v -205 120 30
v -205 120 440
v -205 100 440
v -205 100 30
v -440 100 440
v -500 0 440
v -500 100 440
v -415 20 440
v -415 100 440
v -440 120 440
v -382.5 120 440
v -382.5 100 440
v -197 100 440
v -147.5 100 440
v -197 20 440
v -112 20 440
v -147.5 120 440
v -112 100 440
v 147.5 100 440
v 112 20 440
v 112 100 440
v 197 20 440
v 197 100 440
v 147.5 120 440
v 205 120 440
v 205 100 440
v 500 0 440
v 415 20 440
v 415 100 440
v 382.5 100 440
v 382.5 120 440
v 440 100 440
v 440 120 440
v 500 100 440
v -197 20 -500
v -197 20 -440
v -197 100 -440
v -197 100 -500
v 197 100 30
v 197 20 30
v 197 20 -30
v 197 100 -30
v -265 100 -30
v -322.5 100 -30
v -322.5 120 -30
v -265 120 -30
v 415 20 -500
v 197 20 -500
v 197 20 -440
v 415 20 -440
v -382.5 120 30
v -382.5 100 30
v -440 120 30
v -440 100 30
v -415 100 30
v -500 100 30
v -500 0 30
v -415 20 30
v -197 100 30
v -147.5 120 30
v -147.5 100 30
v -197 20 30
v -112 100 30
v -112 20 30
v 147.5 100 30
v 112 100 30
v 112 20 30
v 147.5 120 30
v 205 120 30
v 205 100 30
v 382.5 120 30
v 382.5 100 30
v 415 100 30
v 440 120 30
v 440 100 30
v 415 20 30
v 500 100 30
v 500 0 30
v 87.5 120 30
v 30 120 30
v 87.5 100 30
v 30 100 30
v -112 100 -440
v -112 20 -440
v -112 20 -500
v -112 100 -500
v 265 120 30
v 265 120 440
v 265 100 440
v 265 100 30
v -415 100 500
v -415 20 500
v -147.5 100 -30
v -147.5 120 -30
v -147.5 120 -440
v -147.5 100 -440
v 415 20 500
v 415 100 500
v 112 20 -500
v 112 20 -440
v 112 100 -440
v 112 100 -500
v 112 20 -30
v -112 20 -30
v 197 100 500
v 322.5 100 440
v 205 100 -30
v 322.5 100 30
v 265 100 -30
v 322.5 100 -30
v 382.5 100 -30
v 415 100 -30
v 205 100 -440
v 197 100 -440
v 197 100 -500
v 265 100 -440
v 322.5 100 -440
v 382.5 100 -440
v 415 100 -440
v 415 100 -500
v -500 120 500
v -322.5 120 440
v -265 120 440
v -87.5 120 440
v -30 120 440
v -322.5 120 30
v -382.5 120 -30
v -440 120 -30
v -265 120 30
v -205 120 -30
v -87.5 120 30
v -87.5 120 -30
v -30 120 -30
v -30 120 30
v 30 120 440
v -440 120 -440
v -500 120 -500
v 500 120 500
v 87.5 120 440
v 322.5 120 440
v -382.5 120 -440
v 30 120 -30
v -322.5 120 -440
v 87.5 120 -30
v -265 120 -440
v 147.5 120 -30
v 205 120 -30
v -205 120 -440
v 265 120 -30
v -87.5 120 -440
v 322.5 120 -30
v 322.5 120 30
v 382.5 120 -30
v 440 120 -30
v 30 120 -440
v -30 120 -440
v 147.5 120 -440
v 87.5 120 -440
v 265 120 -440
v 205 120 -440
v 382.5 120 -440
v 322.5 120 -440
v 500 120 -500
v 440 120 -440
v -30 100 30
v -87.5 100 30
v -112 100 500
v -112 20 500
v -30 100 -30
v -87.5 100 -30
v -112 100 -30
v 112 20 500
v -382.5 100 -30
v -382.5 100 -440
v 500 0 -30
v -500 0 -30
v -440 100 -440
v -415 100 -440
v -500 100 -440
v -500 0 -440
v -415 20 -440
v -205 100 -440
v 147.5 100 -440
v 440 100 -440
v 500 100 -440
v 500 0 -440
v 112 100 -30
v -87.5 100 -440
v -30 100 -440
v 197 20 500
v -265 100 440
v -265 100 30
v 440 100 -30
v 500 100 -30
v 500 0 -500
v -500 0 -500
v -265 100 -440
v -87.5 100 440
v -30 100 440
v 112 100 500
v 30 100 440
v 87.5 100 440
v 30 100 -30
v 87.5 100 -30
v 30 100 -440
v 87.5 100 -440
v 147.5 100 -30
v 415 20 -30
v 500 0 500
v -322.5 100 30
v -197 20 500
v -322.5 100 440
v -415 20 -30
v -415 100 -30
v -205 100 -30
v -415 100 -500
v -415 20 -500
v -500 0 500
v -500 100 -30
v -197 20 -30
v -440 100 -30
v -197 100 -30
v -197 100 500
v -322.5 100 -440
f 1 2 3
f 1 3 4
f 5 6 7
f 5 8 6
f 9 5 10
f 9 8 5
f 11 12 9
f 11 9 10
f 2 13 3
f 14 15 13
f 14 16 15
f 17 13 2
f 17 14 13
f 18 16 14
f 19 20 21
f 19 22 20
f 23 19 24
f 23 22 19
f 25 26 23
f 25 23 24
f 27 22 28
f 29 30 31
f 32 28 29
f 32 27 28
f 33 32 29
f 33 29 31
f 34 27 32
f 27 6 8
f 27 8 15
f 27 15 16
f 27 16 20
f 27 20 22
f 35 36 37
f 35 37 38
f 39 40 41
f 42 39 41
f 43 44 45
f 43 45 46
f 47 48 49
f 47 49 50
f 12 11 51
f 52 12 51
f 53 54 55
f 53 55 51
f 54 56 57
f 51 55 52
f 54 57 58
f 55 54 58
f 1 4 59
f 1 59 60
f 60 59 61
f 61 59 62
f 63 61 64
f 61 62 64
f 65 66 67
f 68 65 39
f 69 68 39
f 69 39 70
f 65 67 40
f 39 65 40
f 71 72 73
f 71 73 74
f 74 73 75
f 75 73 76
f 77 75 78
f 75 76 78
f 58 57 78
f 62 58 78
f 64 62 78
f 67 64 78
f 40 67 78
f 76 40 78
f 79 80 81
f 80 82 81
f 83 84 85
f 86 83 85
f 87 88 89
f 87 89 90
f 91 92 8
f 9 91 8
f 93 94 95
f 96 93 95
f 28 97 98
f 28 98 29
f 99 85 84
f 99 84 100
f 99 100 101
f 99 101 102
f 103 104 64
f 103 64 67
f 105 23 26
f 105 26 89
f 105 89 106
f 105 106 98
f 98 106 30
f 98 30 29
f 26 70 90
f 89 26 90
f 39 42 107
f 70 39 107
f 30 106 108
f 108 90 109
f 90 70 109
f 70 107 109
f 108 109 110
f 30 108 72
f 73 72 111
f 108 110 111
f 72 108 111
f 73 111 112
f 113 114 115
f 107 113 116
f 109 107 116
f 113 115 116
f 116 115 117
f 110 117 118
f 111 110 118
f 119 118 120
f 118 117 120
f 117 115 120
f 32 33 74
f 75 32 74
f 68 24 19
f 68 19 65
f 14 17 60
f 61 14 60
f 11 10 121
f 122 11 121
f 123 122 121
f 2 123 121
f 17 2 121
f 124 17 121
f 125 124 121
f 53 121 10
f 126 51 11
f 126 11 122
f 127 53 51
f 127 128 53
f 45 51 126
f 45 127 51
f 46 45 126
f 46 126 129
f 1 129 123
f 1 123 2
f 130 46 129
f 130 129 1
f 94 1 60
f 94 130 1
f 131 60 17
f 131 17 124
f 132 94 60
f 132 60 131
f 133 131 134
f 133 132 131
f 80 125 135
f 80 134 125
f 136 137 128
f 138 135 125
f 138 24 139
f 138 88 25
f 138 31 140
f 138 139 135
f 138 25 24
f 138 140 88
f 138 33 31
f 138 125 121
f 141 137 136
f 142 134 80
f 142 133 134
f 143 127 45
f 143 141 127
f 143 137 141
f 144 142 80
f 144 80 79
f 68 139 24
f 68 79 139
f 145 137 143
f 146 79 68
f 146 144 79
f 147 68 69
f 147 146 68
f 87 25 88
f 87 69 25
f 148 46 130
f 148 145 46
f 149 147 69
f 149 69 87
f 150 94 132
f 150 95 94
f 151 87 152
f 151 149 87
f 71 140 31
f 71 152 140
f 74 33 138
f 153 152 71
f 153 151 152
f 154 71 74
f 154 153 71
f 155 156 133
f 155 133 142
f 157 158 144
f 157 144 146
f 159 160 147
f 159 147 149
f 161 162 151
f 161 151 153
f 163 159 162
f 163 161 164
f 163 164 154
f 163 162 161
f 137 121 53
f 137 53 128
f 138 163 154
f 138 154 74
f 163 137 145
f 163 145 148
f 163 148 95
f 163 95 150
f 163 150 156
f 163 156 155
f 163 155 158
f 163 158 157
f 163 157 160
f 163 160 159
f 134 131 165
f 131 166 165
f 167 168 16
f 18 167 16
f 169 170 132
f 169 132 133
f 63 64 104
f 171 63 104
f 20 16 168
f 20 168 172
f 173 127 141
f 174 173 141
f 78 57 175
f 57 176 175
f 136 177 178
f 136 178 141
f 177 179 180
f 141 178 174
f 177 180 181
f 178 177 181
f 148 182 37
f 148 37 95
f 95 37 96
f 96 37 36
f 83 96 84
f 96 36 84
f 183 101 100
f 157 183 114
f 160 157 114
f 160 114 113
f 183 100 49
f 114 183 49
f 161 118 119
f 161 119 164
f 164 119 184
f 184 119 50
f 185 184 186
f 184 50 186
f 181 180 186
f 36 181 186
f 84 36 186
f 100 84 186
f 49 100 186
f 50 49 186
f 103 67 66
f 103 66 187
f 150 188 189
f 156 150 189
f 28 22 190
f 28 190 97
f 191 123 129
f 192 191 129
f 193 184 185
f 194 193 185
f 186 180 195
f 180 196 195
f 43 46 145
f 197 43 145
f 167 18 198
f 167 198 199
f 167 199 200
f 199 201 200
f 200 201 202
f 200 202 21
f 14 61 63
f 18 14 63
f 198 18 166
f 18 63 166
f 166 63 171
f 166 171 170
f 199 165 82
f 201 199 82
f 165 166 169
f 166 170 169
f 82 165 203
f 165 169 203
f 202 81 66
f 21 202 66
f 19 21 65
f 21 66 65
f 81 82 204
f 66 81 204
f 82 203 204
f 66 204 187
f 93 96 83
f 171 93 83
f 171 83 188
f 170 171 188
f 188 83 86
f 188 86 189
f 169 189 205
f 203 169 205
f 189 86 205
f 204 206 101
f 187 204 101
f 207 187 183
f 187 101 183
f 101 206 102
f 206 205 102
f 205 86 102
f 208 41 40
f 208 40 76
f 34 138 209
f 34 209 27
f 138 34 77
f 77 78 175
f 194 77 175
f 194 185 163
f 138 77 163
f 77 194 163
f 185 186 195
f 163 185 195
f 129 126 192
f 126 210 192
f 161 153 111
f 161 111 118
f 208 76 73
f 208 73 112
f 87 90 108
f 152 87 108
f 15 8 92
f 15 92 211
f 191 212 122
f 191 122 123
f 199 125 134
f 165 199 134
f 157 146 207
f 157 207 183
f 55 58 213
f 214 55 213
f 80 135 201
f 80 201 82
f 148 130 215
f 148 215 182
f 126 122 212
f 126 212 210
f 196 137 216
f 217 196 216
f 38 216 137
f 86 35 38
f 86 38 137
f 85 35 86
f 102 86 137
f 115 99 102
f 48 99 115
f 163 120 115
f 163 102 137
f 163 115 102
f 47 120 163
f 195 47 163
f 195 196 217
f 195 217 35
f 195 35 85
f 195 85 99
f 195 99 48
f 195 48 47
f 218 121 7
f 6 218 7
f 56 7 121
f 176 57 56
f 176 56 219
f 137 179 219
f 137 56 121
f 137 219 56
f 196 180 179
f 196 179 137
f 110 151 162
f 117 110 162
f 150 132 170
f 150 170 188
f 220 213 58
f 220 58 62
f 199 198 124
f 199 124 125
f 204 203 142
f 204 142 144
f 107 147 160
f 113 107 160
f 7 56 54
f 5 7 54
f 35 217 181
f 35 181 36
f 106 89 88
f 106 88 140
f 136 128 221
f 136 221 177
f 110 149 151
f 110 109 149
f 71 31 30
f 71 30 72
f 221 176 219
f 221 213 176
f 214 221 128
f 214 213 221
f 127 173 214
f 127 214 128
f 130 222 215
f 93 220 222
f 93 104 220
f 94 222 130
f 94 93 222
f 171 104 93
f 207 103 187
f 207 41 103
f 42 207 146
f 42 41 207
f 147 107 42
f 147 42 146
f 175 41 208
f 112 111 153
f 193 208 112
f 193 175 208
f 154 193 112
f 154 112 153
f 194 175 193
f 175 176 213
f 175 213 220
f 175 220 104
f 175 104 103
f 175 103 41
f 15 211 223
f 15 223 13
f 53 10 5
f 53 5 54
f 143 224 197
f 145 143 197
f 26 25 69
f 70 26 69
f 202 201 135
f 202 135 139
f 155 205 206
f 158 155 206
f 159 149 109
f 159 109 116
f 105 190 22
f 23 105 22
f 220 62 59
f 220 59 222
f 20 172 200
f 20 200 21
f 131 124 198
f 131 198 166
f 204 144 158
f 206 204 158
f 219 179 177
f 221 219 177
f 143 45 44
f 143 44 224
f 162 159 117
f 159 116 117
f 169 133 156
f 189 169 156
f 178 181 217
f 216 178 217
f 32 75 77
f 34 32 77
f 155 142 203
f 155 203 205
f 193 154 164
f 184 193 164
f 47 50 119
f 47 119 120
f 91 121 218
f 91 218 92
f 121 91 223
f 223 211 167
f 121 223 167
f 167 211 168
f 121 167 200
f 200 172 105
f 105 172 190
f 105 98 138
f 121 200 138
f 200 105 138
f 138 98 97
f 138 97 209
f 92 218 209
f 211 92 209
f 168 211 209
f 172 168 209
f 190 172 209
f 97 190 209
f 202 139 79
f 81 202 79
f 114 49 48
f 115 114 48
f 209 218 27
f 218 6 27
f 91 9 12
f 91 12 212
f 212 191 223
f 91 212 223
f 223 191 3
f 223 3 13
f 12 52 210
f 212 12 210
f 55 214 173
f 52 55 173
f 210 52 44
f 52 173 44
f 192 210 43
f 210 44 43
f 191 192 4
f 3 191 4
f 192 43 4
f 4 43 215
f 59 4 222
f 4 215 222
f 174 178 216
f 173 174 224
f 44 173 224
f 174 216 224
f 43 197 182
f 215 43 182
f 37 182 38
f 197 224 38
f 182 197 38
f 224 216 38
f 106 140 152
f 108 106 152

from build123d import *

# Parameters (mm, degrees)
SKETCH1_W             = 60
SKETCH1_H             = 1000
BOSS_EXTRUDE1_DEPTH   = 20
BOSS_EXTRUDE1_2_DEPTH = 20
BOSS_EXTRUDE1_3_DEPTH = 20
BOSS_EXTRUDE1_4_DEPTH = 20
SKETCH2_W             = 1000
SKETCH2_H             = 60
BOSS_EXTRUDE2_DEPTH   = 20
SKETCH3_W             = 85
SKETCH3_H             = 60
BOSS_EXTRUDE3_DEPTH   = 80
SKETCH4_W             = 1000
SKETCH4_H             = 60
BOSS_EXTRUDE4_DEPTH   = 20
SKETCH5_W             = 60
SKETCH5_H             = 1000
BOSS_EXTRUDE5_DEPTH   = 20
SKETCH6_W             = 410
SKETCH6_H             = 20
CUT_EXTRUDE1_DEPTH    = 1000


with BuildPart() as part:
    # Sketch1 → Boss-Extrude1 (new body)
    with BuildSketch(Plane(origin=(0, 0, 0), x_dir=(1, 0, 0), z_dir=(0, 1, 0))):
        with Locations((-470, 0)):
            Rectangle(SKETCH1_W, SKETCH1_H)
    extrude(amount=BOSS_EXTRUDE1_DEPTH)



with BuildPart() as body_2:
    # Sketch1 → Boss-Extrude1 2 (new body)
    with BuildSketch(Plane(origin=(0, 0, 0), x_dir=(1, 0, 0), z_dir=(0, 1, 0))):
        with Locations((470, 0)):
            Rectangle(SKETCH1_W, SKETCH1_H)
    extrude(amount=BOSS_EXTRUDE1_2_DEPTH)


with BuildPart() as body_3:
    # Sketch1 → Boss-Extrude1 3 (new body)
    with BuildSketch(Plane(origin=(0, 0, 0), x_dir=(1, 0, 0), z_dir=(0, 1, 0))):
        with Locations((-156.67, 0)):
            Rectangle(SKETCH1_W, SKETCH1_H)
    extrude(amount=BOSS_EXTRUDE1_3_DEPTH)


with BuildPart() as body_4:
    # Sketch1 → Boss-Extrude1 4 (new body)
    with BuildSketch(Plane(origin=(0, 0, 0), x_dir=(1, 0, 0), z_dir=(0, 1, 0))):
        with Locations((156.67, 0)):
            Rectangle(SKETCH1_W, SKETCH1_H)
    extrude(amount=BOSS_EXTRUDE1_4_DEPTH)


with BuildPart() as part_1:
    add(part.part)

    add(body_2.part)  # Boss-Extrude2 merges body 2

    add(body_3.part)  # Boss-Extrude2 merges body 3

    add(body_4.part)  # Boss-Extrude2 merges body 4
    # Sketch2 → Boss-Extrude2 (add)
    with BuildSketch(Plane(origin=(0, 0, 0), x_dir=(1, 0, 0), z_dir=(0, 1, 0))):
        with Locations((0, -470)):
            Rectangle(SKETCH2_W, SKETCH2_H)
        with Locations((0, 470)):
            Rectangle(SKETCH2_W, SKETCH2_H)
        Rectangle(SKETCH2_W, SKETCH2_H)
    extrude(amount=BOSS_EXTRUDE2_DEPTH)

    # Sketch3 → Boss-Extrude3 (add)
    with BuildSketch(Plane(origin=(0, 20, 0), x_dir=(1, 0, 0), z_dir=(0, 1, 0))):
        with Locations((457.5, -470)):
            Rectangle(SKETCH3_W, SKETCH3_H)
        with Locations((457.5, 470)):
            Rectangle(SKETCH3_W, SKETCH3_H)
        with Locations((457.5, 0)):
            Rectangle(SKETCH3_W, SKETCH3_H)
        with Locations((154.5, -470)):
            Rectangle(SKETCH3_W, SKETCH3_H)
        with Locations((154.5, 0)):
            Rectangle(SKETCH3_W, SKETCH3_H)
        with Locations((154.5, 470)):
            Rectangle(SKETCH3_W, SKETCH3_H)
        with Locations((-154.5, 470)):
            Rectangle(SKETCH3_W, SKETCH3_H)
        with Locations((-154.5, 0)):
            Rectangle(SKETCH3_W, SKETCH3_H)
        with Locations((-154.5, -470)):
            Rectangle(SKETCH3_W, SKETCH3_H)
        with Locations((-457.5, 0)):
            Rectangle(SKETCH3_W, SKETCH3_H)
        with Locations((-457.5, 470)):
            Rectangle(SKETCH3_W, SKETCH3_H)
        with Locations((-457.5, -470)):
            Rectangle(SKETCH3_W, SKETCH3_H)
    extrude(amount=BOSS_EXTRUDE3_DEPTH)

    # Sketch4 → Boss-Extrude4 (add)
    with BuildSketch(Plane(origin=(0, 100, 0), x_dir=(1, 0, 0), z_dir=(0, 1, 0))):
        with Locations((0, -470)):
            Rectangle(SKETCH4_W, SKETCH4_H)
        Rectangle(SKETCH4_W, SKETCH4_H)
        with Locations((0, 470)):
            Rectangle(SKETCH4_W, SKETCH4_H)
    extrude(amount=BOSS_EXTRUDE4_DEPTH)

    # Sketch5 → Boss-Extrude5 (add)
    with BuildSketch(Plane(origin=(0, 120, 0), x_dir=(1, 0, 0), z_dir=(0, 1, 0))):
        with Locations((-470, 0)):
            Rectangle(SKETCH5_W, SKETCH5_H)
        with Locations((-352.5, 0)):
            Rectangle(SKETCH5_W, SKETCH5_H)
        with Locations((-235, 0)):
            Rectangle(SKETCH5_W, SKETCH5_H)
        with Locations((-117.5, 0)):
            Rectangle(SKETCH5_W, SKETCH5_H)
        Rectangle(SKETCH5_W, SKETCH5_H)
        with Locations((117.5, 0)):
            Rectangle(SKETCH5_W, SKETCH5_H)
        with Locations((235, 0)):
            Rectangle(SKETCH5_W, SKETCH5_H)
        with Locations((352.5, 0)):
            Rectangle(SKETCH5_W, SKETCH5_H)
        with Locations((470, 0)):
            Rectangle(SKETCH5_W, SKETCH5_H)
    extrude(amount=-BOSS_EXTRUDE5_DEPTH)

    # Sketch6 → Cut-Extrude1 (cut)
    with BuildSketch(Plane(origin=(500, 0, 0), x_dir=(0, 0, -1), z_dir=(1, 0, 0))):
        with Locations((-235, 10)):
            Rectangle(SKETCH6_W, SKETCH6_H)
        with Locations((235, 10)):
            Rectangle(SKETCH6_W, SKETCH6_H)
    extrude(amount=-CUT_EXTRUDE1_DEPTH, mode=Mode.SUBTRACT)


solid = part_1.part
